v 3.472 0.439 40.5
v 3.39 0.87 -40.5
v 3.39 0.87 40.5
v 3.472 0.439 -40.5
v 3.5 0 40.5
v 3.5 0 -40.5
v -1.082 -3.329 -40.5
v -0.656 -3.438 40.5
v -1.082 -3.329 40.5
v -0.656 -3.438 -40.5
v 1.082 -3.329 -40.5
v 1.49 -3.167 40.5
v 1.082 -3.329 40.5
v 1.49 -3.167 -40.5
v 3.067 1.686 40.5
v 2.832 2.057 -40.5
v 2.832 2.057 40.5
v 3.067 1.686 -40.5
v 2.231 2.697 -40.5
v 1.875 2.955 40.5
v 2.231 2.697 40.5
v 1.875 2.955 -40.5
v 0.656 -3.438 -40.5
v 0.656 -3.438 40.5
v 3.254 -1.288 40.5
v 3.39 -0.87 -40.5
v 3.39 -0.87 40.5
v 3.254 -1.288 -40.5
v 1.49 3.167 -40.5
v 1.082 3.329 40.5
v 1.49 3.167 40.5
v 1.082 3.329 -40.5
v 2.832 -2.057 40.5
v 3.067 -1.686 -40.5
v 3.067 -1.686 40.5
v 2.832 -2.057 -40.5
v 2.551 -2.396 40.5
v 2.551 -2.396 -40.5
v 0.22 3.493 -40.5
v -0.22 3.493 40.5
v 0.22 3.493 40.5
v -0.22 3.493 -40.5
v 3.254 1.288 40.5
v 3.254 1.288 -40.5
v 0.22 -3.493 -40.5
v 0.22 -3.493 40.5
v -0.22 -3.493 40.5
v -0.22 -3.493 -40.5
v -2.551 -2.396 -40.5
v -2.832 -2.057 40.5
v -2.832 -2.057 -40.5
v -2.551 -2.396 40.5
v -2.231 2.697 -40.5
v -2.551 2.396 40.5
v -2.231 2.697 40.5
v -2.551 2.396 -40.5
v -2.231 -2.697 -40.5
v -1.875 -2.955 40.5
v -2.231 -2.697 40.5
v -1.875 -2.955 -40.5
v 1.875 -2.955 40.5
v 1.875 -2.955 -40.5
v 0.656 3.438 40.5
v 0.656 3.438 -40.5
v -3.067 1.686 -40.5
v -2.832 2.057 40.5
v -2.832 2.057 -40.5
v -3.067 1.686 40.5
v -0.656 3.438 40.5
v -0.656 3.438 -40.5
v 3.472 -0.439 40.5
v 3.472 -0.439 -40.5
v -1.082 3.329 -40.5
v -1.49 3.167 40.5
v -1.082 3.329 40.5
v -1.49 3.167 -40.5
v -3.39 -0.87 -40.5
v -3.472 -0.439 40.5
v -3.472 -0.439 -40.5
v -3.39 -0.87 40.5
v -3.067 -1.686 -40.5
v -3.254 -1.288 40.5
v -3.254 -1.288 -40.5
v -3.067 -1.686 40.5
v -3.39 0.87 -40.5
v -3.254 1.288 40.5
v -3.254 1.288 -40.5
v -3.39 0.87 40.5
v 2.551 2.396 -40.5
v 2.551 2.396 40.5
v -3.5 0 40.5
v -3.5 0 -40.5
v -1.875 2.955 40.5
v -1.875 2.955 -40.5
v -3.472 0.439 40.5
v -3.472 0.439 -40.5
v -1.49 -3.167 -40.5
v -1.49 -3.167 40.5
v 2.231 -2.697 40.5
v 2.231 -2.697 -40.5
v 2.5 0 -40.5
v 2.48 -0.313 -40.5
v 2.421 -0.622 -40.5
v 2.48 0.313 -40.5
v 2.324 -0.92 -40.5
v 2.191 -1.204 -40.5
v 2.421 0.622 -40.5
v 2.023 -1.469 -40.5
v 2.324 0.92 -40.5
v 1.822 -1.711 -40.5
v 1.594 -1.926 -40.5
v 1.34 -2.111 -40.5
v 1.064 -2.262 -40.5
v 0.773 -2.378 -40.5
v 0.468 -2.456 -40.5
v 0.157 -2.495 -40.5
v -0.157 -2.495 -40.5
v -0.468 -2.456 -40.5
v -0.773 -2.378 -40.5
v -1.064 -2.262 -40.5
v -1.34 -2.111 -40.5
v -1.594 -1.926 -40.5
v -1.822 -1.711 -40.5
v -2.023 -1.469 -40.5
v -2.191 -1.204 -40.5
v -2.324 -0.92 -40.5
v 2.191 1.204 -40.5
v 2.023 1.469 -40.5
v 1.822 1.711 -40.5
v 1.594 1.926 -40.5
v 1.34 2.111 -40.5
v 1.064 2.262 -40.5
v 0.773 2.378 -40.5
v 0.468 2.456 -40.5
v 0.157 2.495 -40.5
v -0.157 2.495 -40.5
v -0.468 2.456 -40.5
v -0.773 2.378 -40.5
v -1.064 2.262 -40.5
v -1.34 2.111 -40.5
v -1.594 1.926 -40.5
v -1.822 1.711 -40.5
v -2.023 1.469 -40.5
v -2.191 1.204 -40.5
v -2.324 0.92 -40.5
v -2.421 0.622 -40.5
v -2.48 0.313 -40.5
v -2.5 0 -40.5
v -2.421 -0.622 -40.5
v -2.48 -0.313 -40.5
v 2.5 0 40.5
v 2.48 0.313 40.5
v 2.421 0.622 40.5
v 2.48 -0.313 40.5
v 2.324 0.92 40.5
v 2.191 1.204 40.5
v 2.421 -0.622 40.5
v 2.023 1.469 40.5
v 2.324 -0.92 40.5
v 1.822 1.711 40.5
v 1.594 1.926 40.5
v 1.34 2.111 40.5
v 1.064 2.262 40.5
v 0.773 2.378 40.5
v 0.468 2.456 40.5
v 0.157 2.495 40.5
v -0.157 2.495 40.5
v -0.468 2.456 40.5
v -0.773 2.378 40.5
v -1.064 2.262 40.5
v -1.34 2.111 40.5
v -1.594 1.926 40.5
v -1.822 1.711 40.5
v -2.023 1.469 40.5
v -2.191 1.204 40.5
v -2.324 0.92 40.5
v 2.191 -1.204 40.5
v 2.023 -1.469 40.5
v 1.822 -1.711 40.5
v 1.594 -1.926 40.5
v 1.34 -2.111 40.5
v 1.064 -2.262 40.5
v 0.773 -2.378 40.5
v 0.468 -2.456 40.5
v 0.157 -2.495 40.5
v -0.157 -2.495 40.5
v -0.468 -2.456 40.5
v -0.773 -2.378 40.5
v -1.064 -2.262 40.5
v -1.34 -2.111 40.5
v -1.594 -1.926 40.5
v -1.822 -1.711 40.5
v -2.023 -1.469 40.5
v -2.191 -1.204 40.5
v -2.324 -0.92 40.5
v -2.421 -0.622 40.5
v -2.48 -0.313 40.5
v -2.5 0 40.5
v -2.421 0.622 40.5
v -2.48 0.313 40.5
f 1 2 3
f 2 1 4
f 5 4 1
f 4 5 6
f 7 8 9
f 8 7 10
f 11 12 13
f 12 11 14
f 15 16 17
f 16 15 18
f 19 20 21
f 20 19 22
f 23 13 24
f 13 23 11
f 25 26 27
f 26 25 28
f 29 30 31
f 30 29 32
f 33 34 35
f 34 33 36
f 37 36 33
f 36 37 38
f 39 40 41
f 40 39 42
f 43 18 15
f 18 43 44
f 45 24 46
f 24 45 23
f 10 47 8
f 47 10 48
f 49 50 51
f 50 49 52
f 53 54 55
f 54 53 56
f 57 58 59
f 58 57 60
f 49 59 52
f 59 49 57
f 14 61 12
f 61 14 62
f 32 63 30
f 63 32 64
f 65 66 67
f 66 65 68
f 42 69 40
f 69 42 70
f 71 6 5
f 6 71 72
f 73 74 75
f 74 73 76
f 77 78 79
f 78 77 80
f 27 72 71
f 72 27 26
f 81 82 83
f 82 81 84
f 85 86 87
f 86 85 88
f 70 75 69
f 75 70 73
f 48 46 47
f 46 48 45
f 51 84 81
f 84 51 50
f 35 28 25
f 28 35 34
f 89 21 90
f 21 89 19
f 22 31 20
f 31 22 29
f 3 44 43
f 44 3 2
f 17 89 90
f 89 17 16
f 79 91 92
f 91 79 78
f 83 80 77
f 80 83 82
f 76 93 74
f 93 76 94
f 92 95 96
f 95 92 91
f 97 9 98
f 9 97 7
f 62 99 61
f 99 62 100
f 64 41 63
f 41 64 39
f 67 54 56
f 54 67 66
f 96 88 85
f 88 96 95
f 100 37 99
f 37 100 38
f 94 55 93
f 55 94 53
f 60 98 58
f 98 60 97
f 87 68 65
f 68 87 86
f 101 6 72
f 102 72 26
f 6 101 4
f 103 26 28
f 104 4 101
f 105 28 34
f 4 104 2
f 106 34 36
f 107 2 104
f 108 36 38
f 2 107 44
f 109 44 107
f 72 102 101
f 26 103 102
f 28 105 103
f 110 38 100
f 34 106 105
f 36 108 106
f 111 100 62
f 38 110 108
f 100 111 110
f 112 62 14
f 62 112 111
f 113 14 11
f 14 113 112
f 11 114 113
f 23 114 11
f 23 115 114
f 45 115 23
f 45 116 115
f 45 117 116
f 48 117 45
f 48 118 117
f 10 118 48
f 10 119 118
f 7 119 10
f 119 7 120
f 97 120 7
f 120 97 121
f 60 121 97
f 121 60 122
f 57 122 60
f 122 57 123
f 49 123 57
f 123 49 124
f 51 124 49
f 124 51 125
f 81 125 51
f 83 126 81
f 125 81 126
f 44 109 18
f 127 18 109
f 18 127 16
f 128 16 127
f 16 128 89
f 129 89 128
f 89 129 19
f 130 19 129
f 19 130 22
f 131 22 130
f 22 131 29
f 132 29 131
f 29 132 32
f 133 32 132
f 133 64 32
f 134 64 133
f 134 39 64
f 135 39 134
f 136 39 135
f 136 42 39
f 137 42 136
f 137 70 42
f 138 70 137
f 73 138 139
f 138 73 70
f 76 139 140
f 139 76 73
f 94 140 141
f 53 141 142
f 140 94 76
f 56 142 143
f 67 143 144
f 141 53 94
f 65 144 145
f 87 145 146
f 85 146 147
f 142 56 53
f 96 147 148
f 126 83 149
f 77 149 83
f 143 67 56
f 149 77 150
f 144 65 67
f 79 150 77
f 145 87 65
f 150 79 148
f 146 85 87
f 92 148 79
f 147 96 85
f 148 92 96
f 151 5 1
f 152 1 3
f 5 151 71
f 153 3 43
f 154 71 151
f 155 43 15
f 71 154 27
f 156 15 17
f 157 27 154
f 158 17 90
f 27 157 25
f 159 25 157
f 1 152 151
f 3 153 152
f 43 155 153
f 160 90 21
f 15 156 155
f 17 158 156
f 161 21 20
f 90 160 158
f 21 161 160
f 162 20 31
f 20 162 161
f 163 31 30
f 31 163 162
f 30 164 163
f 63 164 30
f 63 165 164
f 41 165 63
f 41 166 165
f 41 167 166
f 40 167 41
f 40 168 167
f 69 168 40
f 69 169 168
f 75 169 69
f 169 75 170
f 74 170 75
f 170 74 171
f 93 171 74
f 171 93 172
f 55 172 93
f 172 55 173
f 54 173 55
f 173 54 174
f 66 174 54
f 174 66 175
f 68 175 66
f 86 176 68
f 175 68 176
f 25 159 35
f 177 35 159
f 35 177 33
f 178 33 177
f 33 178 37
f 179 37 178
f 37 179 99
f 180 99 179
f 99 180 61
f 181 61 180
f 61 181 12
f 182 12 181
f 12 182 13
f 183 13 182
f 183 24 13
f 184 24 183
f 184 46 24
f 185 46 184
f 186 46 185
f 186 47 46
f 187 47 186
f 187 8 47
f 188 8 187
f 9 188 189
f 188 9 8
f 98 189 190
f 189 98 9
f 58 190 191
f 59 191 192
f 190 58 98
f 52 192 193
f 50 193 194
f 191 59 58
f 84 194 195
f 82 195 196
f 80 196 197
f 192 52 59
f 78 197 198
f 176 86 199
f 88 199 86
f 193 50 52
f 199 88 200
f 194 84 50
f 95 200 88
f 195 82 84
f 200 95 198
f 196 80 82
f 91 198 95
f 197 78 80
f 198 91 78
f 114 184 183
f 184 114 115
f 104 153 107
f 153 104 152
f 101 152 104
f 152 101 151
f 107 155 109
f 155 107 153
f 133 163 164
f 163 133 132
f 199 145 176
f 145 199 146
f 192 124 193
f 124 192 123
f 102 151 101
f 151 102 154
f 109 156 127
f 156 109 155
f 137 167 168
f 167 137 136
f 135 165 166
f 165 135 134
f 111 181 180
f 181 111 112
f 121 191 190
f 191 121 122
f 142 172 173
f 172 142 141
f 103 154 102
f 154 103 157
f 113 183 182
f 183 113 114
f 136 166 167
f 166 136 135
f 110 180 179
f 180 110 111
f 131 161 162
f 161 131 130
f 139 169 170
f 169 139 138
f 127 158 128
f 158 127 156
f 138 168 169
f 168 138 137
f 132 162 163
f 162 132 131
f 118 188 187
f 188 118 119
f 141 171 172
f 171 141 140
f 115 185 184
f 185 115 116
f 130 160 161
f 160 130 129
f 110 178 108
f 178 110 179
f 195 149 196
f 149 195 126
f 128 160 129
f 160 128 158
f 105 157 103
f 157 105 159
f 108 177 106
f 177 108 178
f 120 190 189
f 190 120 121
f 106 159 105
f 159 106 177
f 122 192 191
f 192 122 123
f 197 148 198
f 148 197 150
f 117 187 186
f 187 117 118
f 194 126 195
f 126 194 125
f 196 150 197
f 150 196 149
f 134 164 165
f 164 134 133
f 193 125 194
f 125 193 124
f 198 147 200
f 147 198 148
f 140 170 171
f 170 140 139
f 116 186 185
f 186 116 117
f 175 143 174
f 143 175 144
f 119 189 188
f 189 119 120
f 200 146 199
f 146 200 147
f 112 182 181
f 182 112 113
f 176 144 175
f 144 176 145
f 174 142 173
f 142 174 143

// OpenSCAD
$fn = 50;


difference() {
	union() {
		translate(v = [0, 0, -40.5000000000]) {
			cylinder(h = 81, r = 3.5000000000);
		}
	}
	union() {
		translate(v = [0, 0, -100.0000000000]) {
			cylinder(h = 200, r = 2.5000000000);
		}
	}
}
